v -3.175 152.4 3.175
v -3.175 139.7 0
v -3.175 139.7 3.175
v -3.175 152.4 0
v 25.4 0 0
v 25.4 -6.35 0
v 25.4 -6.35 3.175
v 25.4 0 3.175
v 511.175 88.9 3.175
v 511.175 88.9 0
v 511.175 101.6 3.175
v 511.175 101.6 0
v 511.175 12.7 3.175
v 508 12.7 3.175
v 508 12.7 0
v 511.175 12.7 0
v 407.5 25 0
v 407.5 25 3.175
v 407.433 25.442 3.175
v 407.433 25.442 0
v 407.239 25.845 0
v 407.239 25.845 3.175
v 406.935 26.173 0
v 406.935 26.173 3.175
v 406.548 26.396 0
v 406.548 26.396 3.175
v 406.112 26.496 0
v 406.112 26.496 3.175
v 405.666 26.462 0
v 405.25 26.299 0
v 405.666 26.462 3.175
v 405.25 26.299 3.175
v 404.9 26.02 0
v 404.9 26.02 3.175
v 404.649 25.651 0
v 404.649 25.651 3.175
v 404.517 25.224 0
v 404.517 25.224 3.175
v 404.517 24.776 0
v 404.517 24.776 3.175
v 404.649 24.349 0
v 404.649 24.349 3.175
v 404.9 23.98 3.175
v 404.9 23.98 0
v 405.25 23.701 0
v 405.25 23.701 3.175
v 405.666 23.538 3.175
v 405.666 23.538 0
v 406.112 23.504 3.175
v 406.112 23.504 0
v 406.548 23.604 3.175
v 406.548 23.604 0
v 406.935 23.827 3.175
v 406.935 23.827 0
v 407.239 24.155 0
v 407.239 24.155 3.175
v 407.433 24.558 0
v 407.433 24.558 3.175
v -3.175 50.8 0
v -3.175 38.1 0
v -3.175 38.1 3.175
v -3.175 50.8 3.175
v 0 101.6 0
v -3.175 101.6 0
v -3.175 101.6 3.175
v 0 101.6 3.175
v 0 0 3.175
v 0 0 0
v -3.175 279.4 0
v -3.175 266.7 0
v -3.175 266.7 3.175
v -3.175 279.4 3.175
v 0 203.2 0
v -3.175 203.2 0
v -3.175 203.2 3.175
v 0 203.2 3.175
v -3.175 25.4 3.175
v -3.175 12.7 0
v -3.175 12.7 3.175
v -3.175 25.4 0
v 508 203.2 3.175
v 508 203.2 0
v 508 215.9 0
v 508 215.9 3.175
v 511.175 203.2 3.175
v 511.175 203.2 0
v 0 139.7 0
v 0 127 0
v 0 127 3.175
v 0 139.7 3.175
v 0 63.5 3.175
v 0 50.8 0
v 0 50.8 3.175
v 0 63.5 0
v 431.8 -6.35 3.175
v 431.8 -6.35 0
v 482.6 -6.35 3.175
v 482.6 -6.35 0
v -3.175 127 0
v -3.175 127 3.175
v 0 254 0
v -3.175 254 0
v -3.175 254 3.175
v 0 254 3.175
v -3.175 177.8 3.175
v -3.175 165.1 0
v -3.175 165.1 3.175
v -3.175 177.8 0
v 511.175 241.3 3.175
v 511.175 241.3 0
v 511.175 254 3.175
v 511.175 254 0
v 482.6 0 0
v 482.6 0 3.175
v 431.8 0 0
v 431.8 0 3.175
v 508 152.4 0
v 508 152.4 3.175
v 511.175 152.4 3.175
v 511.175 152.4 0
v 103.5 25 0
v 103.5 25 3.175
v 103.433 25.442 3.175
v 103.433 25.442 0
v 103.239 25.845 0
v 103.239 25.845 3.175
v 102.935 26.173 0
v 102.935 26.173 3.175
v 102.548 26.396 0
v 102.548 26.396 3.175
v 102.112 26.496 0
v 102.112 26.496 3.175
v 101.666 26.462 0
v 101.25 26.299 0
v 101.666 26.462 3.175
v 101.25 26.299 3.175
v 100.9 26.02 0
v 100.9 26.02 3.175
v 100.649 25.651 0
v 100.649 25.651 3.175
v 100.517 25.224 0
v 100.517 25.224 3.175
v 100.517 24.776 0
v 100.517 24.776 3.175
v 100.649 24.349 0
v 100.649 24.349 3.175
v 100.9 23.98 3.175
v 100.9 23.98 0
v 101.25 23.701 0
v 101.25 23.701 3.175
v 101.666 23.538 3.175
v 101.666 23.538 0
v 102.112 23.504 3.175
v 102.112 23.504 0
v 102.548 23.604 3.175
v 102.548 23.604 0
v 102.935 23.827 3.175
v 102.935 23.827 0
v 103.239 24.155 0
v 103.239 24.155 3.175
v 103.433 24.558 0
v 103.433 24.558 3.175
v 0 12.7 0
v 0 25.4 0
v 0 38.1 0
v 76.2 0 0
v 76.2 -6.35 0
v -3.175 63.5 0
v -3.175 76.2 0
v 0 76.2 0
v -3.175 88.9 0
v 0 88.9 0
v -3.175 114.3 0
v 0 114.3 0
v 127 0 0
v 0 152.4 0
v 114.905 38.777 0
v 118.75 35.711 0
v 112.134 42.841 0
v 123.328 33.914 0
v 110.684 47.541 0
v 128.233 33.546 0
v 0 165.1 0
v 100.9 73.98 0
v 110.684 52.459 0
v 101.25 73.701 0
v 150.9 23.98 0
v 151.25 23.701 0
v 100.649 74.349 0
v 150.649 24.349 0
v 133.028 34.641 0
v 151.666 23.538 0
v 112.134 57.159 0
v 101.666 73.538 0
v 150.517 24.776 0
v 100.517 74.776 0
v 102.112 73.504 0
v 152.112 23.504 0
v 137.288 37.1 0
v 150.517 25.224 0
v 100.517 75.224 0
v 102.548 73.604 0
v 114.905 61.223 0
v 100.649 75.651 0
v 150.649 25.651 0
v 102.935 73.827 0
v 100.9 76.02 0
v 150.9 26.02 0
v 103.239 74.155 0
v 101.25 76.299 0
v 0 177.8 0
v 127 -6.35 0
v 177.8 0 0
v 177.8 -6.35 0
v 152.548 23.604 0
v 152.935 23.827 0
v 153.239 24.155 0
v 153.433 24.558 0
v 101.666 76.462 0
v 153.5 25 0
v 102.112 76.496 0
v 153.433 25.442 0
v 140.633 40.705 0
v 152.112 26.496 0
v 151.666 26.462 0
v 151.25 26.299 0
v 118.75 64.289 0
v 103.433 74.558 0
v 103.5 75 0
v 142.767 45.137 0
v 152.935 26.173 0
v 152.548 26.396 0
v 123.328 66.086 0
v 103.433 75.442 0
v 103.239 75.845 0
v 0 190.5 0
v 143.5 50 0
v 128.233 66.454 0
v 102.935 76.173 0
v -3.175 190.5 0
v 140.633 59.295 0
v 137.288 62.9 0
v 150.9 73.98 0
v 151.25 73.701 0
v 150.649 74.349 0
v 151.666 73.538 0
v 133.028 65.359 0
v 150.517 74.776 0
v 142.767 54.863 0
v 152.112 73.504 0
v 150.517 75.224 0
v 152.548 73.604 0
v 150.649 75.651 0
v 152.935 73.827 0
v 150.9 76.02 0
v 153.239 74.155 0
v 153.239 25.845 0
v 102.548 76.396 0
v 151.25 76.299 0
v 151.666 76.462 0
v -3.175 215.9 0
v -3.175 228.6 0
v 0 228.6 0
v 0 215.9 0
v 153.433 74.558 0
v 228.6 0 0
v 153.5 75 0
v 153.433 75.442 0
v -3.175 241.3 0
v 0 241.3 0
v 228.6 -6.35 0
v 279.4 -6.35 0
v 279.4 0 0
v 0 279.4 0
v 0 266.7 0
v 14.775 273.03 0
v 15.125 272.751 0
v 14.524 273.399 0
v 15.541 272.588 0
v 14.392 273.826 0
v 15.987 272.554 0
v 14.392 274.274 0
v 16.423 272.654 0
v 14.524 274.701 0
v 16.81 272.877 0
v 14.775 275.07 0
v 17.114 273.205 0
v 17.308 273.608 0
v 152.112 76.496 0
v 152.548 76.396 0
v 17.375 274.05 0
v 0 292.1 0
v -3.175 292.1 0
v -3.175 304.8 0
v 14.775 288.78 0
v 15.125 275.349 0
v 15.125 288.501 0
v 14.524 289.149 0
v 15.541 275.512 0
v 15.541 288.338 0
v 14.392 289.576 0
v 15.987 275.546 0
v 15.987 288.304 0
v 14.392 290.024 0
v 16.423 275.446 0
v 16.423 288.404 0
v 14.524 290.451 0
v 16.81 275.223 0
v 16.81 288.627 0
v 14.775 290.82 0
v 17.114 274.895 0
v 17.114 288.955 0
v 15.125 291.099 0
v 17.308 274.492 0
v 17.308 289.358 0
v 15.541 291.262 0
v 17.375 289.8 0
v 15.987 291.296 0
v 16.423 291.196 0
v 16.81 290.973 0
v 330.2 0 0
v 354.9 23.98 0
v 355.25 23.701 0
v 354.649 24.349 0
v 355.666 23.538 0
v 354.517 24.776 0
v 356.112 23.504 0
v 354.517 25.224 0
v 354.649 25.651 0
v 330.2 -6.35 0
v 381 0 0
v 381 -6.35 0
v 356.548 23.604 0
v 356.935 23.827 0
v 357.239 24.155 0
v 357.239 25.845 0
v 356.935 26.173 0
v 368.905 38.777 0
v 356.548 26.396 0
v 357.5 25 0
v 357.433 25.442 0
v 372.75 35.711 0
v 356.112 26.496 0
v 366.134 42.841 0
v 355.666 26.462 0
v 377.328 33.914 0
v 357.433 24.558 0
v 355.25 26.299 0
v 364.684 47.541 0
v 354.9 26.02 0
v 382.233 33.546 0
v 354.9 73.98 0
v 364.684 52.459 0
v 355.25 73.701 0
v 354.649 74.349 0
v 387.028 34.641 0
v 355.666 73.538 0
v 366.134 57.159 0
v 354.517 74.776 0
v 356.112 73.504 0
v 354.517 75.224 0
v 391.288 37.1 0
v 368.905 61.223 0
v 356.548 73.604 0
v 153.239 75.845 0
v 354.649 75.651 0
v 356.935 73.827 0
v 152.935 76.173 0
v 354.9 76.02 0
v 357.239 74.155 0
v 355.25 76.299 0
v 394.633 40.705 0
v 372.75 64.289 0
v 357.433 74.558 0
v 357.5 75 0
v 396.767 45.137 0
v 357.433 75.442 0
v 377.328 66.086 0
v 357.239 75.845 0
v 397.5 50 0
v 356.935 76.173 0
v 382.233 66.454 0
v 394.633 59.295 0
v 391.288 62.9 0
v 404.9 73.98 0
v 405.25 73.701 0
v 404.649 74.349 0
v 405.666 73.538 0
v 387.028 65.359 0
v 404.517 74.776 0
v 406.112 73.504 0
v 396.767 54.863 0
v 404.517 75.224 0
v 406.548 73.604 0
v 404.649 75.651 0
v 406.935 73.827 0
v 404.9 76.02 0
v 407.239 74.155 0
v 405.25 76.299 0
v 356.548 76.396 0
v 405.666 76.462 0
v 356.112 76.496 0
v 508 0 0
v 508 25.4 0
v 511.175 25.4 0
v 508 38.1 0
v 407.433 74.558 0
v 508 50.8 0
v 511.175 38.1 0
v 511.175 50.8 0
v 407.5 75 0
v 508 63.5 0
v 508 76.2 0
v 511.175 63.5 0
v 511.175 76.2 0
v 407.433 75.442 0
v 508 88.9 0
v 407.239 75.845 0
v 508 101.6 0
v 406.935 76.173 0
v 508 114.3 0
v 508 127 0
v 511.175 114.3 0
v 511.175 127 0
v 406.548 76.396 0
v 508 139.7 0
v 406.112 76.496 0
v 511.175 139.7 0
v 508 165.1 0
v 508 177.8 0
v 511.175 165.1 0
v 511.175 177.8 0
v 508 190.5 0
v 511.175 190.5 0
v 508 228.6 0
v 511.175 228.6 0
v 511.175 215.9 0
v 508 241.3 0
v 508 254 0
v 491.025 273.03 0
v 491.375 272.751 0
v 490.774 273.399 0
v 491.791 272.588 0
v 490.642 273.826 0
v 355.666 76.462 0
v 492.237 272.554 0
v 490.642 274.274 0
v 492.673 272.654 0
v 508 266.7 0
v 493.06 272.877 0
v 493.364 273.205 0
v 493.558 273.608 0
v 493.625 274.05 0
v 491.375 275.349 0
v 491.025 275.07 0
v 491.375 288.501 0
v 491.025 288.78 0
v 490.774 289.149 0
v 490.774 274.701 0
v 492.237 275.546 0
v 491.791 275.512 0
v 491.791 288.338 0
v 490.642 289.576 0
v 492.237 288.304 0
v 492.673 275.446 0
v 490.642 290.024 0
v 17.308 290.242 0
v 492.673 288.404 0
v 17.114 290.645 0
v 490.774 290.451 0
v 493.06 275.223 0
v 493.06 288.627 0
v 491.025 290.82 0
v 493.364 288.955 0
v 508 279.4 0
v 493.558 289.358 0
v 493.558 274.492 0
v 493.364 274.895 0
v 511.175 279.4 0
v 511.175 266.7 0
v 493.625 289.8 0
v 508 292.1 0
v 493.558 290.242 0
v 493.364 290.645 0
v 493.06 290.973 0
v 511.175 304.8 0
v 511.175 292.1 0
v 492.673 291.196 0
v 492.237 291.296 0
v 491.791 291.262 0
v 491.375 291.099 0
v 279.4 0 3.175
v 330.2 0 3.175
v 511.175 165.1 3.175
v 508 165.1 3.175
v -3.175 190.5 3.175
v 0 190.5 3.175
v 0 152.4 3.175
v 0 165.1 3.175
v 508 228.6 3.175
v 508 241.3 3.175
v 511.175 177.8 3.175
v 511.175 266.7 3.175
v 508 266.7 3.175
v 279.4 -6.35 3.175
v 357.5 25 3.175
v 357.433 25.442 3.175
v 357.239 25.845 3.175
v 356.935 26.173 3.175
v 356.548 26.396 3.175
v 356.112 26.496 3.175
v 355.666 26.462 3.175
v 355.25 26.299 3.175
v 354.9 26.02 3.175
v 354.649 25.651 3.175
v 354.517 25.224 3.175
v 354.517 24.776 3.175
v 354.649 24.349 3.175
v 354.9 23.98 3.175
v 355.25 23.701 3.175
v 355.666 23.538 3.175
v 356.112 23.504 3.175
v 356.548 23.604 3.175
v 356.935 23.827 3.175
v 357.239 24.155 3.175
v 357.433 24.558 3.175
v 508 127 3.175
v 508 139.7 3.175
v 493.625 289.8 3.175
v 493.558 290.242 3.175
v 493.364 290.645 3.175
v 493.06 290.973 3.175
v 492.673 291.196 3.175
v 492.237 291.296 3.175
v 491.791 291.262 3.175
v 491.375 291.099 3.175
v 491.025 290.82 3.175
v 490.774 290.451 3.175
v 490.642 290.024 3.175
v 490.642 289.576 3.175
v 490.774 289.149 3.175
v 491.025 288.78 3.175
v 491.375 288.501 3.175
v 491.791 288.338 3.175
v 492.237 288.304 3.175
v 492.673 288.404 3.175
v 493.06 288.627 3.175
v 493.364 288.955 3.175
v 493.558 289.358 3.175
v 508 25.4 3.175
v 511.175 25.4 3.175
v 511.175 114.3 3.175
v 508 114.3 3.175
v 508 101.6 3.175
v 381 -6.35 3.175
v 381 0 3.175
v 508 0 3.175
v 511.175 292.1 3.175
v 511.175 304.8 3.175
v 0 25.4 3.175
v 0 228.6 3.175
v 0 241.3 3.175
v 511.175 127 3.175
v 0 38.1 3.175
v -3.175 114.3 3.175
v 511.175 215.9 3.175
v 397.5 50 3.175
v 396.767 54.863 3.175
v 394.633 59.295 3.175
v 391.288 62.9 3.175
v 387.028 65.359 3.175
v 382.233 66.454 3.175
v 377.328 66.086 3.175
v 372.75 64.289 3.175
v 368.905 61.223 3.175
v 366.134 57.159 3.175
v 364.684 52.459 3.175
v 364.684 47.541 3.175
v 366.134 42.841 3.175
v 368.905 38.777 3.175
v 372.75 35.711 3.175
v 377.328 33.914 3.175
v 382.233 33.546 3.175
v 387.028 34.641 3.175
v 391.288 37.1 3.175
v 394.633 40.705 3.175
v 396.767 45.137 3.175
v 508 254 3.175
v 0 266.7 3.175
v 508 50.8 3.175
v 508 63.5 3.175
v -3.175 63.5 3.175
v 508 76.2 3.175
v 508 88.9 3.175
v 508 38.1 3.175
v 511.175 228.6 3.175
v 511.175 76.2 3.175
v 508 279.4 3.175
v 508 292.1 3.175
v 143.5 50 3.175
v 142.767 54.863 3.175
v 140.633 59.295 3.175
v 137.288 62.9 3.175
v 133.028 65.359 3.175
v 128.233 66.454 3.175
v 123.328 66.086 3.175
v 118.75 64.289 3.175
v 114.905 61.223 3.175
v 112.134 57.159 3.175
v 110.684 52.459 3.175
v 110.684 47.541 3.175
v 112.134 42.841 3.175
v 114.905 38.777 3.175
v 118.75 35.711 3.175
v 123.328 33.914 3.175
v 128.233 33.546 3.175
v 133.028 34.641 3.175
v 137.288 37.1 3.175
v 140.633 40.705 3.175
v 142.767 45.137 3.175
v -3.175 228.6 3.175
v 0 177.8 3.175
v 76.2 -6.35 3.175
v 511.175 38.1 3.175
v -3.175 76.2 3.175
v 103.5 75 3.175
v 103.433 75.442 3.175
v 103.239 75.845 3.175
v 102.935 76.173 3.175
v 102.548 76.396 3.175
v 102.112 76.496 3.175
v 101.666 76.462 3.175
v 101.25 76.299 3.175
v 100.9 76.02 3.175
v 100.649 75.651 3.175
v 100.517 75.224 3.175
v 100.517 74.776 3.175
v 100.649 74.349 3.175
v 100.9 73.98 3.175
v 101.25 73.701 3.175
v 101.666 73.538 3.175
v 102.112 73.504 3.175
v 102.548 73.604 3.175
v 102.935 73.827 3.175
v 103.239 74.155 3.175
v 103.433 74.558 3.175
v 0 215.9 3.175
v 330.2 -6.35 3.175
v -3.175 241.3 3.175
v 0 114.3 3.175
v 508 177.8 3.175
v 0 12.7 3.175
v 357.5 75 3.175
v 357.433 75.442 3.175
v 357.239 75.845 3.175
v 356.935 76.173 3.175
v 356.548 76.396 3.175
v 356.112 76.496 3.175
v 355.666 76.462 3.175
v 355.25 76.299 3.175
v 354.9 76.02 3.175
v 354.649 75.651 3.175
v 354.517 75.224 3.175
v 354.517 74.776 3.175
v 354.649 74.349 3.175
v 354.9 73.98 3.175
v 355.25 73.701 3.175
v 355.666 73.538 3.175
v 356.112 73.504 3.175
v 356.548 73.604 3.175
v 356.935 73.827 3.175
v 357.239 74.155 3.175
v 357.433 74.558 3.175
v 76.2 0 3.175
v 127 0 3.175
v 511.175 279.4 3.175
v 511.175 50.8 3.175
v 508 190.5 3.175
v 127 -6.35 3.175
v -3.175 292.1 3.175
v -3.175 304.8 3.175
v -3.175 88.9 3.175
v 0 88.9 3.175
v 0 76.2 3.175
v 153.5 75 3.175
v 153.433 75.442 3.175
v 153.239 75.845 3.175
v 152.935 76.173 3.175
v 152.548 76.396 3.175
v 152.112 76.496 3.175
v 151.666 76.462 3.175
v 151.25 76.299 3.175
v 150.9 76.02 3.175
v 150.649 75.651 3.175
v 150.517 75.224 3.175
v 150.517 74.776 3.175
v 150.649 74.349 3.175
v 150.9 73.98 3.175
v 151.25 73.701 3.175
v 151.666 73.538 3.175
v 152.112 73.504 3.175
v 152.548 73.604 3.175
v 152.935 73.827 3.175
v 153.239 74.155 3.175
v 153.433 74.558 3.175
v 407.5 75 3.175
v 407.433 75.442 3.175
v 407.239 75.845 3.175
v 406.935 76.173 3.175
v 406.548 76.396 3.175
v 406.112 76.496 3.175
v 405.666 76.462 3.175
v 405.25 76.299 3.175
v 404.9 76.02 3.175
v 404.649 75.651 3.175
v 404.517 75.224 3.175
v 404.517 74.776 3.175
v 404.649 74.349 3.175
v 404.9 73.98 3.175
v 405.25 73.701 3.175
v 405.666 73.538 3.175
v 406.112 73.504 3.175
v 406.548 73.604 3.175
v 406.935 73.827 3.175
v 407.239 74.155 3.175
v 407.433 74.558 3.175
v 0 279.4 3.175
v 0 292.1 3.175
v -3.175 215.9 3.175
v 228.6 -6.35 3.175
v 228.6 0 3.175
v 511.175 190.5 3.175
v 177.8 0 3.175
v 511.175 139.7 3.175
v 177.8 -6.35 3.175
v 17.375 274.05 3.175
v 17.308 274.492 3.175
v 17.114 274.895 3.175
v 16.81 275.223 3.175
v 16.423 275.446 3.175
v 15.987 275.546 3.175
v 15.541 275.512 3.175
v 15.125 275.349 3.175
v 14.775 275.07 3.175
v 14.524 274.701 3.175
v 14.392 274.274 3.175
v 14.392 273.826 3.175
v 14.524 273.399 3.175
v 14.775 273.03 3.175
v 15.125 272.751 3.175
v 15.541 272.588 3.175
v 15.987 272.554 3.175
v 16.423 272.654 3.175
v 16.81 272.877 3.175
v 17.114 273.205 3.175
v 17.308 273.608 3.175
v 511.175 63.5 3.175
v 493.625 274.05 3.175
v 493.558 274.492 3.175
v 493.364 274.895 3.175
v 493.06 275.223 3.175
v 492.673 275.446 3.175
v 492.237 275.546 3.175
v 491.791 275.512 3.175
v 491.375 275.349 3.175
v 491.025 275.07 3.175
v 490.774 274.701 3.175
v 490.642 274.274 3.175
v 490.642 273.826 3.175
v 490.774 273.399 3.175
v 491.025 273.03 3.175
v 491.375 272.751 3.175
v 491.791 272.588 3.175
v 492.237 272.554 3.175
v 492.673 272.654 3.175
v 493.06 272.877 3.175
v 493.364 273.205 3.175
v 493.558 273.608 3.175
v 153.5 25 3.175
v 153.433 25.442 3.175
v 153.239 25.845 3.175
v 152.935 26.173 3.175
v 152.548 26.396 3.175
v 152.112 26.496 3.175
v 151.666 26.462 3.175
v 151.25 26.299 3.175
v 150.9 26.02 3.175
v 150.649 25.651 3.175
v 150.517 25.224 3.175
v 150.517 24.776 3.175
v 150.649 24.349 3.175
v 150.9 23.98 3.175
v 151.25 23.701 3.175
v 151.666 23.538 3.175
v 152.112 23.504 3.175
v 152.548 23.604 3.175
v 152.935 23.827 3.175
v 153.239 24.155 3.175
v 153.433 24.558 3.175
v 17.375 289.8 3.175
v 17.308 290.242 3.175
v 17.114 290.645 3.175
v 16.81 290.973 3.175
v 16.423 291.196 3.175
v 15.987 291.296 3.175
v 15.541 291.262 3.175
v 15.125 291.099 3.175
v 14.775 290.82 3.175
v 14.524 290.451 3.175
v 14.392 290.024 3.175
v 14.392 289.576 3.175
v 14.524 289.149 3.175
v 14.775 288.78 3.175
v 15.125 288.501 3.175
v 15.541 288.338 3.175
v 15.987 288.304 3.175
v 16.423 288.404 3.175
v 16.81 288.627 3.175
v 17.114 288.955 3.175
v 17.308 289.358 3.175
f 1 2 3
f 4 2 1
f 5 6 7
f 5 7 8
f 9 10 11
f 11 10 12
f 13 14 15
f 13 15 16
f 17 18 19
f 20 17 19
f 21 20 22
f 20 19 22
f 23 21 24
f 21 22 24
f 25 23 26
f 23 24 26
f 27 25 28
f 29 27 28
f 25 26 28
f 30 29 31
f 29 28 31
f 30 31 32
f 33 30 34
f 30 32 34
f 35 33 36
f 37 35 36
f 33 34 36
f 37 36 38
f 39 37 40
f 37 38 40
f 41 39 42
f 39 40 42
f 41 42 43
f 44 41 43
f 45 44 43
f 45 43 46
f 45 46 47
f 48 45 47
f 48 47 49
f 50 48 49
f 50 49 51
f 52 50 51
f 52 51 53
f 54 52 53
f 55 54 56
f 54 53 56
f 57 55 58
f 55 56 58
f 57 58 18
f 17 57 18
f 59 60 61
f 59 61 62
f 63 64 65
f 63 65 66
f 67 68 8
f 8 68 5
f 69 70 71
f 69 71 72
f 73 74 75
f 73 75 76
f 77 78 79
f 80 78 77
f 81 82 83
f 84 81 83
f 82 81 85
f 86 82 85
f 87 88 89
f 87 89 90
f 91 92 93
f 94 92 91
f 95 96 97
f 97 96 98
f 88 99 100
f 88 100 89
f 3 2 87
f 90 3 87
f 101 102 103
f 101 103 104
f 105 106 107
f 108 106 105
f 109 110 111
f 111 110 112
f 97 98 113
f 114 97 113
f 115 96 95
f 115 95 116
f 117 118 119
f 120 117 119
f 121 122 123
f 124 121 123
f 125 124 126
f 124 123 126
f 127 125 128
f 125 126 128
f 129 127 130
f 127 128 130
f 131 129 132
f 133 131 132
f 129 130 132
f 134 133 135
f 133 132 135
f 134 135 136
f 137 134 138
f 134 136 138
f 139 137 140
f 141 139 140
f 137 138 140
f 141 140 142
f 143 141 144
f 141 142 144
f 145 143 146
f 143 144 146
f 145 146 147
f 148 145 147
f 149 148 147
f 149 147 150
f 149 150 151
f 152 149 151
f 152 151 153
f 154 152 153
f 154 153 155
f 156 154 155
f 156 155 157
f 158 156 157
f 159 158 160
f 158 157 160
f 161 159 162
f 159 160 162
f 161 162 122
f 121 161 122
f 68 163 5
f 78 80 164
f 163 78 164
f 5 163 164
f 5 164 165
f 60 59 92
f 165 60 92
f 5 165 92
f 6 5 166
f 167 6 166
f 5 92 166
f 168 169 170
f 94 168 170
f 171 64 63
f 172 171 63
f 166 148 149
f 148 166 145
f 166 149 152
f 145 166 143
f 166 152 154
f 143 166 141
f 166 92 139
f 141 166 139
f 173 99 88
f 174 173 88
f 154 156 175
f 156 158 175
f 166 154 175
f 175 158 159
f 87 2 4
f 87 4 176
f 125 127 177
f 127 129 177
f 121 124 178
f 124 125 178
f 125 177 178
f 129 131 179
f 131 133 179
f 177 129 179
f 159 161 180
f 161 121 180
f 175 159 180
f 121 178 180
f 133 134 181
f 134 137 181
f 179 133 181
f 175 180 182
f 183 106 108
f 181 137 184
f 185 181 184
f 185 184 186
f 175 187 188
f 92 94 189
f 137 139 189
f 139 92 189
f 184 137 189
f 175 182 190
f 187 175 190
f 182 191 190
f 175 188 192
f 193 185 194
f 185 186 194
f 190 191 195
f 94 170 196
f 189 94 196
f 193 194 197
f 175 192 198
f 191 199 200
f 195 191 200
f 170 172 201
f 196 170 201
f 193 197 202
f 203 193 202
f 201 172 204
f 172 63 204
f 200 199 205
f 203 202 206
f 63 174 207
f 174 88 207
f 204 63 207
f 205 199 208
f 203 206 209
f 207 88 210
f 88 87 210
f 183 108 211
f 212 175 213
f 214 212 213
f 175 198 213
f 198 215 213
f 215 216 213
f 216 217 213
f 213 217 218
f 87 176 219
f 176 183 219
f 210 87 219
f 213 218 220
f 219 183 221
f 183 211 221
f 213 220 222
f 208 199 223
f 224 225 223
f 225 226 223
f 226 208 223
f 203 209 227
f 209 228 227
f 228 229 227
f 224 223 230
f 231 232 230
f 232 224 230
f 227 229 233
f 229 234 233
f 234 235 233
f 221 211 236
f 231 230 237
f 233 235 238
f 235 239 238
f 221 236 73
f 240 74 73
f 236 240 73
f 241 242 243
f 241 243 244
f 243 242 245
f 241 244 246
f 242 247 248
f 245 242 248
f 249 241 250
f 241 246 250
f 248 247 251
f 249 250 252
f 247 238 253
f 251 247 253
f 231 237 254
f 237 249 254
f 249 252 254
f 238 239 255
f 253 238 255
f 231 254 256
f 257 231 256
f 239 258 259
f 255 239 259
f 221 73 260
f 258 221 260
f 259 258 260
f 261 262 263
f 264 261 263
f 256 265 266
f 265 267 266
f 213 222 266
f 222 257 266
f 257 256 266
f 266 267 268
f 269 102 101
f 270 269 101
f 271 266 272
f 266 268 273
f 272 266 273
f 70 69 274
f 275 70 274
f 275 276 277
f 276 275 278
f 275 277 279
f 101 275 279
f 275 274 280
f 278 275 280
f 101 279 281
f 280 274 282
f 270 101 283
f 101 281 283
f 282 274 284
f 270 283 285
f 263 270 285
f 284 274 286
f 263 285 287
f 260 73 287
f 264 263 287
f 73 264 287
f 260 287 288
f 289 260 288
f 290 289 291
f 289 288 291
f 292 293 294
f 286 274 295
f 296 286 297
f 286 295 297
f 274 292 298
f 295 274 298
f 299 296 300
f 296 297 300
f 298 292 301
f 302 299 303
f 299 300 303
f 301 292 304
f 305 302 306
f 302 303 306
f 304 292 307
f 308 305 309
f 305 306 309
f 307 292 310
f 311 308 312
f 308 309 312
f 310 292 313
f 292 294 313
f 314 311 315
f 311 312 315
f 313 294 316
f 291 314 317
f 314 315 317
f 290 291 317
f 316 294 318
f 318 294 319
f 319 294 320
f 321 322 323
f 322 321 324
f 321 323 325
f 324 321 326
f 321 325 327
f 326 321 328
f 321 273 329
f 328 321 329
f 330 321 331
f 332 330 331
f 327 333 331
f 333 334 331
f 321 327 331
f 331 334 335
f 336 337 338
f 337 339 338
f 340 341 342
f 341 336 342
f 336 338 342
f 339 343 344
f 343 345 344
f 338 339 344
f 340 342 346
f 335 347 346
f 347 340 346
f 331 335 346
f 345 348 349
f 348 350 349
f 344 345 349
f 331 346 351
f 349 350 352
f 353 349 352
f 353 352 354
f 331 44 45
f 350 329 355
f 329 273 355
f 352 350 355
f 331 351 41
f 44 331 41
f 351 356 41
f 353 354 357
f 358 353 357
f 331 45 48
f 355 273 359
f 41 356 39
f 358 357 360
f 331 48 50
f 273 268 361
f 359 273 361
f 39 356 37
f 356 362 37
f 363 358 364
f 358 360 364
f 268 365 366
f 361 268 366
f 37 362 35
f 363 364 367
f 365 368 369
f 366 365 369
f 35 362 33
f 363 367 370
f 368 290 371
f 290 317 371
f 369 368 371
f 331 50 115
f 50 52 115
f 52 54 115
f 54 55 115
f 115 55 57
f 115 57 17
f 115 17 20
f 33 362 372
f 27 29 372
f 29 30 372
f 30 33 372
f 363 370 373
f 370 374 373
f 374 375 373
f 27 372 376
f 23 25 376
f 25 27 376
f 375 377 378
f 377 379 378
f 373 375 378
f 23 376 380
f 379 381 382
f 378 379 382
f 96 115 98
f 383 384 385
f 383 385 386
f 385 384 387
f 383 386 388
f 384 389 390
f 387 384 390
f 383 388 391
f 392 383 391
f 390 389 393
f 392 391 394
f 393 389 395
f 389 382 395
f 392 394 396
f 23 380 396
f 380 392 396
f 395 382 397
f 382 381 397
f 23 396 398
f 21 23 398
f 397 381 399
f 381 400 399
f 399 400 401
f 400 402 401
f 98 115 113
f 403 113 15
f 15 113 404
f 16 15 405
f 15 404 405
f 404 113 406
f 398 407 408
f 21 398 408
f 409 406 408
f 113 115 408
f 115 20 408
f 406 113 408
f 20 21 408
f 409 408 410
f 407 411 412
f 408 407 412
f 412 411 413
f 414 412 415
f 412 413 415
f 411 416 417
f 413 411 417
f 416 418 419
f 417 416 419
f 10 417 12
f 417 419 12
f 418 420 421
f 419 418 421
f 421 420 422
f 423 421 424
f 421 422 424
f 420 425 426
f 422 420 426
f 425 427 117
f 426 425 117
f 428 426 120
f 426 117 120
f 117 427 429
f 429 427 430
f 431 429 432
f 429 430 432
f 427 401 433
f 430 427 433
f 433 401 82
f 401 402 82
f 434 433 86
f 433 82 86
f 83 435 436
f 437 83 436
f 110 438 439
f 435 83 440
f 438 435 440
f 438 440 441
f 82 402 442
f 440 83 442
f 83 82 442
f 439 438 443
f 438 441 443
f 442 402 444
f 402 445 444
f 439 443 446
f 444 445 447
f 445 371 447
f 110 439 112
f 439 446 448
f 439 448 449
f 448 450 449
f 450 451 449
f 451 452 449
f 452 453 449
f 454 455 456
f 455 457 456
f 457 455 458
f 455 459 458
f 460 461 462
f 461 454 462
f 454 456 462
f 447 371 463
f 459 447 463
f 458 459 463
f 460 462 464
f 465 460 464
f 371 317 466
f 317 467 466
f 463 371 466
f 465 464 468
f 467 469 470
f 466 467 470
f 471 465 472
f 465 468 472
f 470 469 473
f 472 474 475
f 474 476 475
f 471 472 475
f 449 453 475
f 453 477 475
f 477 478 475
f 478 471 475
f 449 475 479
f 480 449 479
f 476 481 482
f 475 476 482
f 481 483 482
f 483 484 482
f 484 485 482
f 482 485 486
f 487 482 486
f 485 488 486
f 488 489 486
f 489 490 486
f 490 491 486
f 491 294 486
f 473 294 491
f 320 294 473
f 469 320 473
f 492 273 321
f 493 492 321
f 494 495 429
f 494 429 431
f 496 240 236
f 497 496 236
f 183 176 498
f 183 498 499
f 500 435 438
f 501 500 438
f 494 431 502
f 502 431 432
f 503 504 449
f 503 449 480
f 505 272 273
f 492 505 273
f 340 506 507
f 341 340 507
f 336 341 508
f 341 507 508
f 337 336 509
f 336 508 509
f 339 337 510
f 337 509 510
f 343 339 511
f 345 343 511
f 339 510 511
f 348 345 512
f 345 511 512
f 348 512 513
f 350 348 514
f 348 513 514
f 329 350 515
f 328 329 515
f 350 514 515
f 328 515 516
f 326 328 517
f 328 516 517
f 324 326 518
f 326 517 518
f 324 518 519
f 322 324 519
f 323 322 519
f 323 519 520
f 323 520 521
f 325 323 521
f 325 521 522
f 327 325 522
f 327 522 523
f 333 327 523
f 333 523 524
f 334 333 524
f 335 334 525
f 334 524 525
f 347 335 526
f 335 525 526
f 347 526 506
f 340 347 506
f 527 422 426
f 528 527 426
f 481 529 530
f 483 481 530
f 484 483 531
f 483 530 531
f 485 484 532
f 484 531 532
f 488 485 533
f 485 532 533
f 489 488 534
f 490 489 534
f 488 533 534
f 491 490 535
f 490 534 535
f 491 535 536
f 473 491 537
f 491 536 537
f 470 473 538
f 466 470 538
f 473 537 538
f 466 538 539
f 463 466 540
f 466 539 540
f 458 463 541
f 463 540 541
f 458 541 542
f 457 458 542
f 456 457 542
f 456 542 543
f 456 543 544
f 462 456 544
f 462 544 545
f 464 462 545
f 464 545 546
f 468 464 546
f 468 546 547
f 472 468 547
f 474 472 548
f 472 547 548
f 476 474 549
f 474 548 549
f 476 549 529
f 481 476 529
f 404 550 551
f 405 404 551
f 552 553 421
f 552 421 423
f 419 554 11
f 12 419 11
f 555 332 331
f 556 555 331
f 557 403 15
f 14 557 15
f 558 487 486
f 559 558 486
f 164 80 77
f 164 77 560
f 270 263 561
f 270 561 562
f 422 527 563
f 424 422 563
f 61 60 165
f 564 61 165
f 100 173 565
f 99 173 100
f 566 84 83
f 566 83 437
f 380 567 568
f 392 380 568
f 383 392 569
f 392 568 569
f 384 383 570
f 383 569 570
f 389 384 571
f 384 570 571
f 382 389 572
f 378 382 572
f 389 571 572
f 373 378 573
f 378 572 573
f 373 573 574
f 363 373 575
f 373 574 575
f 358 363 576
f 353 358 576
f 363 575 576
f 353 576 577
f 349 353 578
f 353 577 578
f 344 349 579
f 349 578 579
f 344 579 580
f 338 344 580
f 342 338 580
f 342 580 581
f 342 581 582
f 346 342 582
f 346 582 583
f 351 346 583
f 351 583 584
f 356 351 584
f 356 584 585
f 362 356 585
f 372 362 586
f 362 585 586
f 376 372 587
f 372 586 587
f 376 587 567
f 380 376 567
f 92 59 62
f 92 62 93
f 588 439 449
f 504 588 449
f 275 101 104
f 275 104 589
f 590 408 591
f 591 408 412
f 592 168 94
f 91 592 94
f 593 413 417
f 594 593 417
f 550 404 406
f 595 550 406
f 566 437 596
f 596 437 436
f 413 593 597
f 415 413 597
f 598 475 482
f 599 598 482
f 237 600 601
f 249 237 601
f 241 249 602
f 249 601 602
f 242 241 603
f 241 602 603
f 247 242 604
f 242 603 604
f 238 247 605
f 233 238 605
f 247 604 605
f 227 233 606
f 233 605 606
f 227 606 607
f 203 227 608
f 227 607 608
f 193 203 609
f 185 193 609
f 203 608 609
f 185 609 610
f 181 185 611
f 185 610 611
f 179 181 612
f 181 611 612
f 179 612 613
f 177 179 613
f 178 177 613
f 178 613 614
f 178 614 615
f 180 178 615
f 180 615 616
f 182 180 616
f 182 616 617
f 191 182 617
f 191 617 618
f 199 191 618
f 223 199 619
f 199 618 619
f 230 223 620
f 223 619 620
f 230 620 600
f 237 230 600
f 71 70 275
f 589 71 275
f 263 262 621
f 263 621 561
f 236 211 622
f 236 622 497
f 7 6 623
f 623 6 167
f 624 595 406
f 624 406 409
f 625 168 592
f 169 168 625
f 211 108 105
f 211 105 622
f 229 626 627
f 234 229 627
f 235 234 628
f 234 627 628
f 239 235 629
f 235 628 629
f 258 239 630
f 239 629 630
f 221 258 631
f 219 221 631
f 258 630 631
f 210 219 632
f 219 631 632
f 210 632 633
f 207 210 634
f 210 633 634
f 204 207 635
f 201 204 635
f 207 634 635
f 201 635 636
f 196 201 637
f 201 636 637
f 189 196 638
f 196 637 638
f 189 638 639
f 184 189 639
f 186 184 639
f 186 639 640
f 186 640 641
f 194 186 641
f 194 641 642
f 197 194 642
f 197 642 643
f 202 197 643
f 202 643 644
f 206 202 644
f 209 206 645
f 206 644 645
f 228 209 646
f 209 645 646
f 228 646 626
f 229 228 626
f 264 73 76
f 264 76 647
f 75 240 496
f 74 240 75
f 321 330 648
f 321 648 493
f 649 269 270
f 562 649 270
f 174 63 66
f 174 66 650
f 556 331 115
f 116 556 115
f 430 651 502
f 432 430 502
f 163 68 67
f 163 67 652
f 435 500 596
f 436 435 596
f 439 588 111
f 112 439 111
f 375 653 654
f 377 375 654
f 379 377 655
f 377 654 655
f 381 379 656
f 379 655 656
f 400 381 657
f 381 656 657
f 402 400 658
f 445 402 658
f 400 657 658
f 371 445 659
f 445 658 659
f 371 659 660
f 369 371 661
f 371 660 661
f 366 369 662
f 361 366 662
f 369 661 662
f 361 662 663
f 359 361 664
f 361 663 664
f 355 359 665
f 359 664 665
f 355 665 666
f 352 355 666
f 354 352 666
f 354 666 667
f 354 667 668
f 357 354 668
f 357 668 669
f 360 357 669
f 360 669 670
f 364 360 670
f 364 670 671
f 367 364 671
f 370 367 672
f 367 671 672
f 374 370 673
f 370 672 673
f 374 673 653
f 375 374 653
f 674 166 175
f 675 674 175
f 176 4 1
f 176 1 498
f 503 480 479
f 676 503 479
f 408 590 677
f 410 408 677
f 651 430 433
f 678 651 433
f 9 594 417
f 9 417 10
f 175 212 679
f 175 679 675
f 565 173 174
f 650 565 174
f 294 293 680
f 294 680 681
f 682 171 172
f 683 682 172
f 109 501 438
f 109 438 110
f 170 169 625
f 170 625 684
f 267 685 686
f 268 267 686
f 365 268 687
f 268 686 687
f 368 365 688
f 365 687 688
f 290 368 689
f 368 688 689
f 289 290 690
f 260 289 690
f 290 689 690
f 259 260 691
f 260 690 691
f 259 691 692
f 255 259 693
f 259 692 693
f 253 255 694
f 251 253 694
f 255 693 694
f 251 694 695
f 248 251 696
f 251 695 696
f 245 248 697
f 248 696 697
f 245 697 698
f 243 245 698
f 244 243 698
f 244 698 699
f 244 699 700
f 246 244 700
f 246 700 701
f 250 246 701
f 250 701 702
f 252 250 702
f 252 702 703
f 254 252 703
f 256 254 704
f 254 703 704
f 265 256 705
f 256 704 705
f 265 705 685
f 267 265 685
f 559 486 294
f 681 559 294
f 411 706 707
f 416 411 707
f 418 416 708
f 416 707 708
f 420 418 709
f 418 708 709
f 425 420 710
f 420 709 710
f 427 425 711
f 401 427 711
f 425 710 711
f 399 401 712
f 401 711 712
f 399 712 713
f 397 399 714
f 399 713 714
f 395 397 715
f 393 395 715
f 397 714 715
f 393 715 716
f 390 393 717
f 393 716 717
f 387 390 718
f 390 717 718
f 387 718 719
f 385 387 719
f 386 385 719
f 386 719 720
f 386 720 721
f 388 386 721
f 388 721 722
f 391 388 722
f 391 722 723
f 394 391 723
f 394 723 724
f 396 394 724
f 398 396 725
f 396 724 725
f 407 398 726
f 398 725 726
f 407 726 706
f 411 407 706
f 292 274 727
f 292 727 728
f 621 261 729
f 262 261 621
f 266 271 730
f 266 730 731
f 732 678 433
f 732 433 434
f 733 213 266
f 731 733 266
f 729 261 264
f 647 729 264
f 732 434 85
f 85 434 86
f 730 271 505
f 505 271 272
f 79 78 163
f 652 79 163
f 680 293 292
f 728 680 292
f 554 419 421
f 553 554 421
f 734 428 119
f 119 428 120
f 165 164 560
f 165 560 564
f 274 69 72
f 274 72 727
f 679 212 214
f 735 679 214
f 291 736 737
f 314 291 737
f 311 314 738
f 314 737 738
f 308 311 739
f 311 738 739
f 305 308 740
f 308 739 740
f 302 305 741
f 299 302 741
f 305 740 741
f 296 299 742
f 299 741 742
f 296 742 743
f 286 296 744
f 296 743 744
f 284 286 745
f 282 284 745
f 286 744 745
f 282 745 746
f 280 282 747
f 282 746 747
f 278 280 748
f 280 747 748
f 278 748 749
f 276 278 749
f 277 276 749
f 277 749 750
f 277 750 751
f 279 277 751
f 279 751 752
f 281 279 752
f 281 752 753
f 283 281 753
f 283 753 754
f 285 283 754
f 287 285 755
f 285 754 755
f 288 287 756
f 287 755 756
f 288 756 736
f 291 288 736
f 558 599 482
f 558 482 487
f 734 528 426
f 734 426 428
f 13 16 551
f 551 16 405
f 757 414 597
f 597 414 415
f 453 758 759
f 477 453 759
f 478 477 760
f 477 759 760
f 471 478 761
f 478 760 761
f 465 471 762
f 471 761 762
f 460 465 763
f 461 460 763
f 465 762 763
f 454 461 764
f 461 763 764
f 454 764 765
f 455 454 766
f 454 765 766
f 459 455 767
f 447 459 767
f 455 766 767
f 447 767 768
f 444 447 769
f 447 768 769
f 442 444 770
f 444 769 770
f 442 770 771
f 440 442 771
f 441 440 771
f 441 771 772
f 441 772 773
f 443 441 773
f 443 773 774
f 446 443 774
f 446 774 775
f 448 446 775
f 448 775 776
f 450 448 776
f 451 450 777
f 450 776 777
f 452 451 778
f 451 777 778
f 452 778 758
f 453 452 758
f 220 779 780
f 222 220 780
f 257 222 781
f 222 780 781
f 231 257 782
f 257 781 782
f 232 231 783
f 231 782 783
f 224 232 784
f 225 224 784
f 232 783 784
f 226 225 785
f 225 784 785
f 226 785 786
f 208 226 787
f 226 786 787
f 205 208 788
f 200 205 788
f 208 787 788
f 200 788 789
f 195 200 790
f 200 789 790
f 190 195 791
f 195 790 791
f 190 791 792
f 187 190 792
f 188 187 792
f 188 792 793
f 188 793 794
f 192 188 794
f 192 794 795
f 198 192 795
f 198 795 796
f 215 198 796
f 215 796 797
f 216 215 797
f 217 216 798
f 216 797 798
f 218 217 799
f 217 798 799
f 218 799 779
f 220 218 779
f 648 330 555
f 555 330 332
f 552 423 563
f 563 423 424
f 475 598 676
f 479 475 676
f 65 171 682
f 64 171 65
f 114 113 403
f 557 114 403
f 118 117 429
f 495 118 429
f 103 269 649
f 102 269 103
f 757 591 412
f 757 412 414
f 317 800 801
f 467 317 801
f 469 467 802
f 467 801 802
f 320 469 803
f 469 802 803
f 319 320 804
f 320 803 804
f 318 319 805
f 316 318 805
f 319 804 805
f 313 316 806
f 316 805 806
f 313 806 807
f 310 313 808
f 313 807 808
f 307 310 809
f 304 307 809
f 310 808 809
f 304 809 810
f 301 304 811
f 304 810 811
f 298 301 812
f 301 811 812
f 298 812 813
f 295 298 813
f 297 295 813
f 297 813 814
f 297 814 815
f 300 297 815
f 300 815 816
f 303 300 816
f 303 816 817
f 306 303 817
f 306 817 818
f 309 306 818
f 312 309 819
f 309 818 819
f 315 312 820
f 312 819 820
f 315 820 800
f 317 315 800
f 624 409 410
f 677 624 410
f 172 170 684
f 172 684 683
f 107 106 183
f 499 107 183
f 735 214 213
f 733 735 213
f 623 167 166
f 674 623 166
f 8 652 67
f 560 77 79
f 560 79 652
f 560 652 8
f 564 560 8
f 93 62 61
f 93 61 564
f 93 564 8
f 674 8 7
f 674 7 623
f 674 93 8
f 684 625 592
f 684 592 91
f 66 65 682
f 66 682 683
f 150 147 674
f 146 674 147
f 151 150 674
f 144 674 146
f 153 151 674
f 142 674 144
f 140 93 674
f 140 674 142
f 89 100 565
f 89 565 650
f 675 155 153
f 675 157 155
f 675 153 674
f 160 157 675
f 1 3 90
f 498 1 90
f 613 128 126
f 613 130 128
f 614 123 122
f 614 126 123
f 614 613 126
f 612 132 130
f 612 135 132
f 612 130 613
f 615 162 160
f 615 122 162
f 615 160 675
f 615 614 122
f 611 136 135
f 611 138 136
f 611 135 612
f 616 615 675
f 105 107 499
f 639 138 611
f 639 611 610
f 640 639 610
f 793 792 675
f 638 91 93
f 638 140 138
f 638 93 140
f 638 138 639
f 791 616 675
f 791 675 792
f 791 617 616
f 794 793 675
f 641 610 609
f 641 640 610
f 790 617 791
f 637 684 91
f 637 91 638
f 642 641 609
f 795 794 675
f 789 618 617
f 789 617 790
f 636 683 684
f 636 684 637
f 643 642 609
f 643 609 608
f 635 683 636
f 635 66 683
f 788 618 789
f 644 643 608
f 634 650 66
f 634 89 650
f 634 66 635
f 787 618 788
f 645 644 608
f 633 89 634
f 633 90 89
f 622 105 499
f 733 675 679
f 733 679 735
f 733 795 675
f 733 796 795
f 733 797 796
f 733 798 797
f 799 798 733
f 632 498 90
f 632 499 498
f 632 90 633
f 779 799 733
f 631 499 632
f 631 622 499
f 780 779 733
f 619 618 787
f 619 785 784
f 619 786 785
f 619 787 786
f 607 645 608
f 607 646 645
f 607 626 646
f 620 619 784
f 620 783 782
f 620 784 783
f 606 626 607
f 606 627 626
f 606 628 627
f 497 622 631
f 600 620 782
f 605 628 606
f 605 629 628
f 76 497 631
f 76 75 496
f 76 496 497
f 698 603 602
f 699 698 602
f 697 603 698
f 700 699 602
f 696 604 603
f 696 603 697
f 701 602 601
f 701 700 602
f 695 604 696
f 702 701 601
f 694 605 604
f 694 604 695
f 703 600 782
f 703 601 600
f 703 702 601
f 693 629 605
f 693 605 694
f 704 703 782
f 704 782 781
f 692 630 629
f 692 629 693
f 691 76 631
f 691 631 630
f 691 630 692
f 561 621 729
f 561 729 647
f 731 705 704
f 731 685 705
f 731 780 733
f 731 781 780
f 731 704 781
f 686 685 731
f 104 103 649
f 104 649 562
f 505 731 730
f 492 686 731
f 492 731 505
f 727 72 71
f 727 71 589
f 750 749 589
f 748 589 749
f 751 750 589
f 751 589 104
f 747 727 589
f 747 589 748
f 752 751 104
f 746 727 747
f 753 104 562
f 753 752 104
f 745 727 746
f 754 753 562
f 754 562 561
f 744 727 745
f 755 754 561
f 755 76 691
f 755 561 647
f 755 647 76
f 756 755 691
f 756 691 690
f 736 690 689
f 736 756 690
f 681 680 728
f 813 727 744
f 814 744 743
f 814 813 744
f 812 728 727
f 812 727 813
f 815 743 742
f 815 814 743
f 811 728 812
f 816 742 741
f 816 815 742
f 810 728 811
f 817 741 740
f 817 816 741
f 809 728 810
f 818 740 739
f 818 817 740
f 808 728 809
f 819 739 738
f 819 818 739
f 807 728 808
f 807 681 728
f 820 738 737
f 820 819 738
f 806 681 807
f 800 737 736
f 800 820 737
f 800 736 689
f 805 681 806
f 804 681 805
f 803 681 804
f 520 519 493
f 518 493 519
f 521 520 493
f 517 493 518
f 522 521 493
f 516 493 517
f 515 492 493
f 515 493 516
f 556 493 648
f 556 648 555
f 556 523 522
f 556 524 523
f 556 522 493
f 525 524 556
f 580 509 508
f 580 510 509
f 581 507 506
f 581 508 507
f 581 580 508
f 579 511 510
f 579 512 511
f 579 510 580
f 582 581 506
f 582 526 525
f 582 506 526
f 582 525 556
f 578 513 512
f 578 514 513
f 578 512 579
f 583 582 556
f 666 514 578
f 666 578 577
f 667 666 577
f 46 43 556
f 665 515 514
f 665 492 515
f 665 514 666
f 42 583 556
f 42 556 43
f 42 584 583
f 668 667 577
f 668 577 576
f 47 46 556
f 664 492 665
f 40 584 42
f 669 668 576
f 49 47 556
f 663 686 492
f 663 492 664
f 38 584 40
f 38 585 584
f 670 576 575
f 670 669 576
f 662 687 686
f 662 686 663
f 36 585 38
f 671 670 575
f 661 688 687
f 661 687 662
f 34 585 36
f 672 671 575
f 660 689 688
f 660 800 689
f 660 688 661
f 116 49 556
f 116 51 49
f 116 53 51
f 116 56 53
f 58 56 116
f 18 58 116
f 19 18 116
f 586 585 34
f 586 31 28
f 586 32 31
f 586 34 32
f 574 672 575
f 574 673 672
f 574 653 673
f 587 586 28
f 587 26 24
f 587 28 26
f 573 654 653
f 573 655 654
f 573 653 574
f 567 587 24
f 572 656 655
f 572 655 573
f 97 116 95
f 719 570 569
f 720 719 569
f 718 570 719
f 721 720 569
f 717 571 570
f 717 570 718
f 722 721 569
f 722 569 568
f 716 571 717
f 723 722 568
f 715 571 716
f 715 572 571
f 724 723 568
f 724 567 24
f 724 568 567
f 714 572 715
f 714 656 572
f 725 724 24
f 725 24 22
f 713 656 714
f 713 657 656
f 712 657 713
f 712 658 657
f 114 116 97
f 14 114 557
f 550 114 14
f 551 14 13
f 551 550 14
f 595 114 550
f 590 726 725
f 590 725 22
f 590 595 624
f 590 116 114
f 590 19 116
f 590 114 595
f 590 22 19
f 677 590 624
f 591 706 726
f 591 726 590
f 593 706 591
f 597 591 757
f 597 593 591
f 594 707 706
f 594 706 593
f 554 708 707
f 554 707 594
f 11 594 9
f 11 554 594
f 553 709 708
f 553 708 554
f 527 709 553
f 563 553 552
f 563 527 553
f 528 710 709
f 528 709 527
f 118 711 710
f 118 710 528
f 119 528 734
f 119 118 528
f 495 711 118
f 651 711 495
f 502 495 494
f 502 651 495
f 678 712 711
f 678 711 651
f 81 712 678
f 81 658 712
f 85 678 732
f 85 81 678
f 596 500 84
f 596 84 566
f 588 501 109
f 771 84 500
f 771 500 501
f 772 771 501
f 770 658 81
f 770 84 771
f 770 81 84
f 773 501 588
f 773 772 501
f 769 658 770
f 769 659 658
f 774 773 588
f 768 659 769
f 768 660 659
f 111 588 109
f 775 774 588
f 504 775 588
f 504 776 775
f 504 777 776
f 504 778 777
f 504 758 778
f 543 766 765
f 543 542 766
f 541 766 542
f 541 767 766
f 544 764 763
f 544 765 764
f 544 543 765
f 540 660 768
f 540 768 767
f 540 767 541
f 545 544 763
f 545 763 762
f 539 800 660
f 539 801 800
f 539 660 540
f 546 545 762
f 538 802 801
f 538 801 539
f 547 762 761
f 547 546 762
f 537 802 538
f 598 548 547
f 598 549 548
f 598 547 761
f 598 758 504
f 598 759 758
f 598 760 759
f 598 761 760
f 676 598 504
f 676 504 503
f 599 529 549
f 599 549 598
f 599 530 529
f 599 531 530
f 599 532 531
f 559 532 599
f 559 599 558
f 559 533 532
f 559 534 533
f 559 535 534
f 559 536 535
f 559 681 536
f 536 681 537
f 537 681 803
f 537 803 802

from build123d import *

# Parameters (mm, degrees)
SKETCH1_W           = 508
SKETCH1_H           = 304.8
SKETCH1_W_2         = 50.8
SKETCH1_H_2         = 6.35
SKETCH1_W_3         = 3.175
SKETCH1_H_3         = 12.7
BOSS_EXTRUDE1_DEPTH = 3.175
SKETCH2_R           = 16.5
SKETCH2_R_2         = 1.5
CUT_EXTRUDE1_DEPTH  = 3.175
SKETCH3_R           = 1.5
CUT_EXTRUDE2_DEPTH  = 3.175


with BuildPart() as part:
    # Sketch1 → Boss-Extrude1 (new body)
    with BuildSketch(Plane.XY):
        with Locations((254, 152.4)):
            Rectangle(SKETCH1_W, SKETCH1_H)
        with Locations((50.8, -3.175)):
            Rectangle(SKETCH1_W_2, SKETCH1_H_2)
        with Locations((152.4, -3.175)):
            Rectangle(SKETCH1_W_2, SKETCH1_H_2)
        with Locations((254, -3.175)):
            Rectangle(SKETCH1_W_2, SKETCH1_H_2)
        with Locations((355.6, -3.175)):
            Rectangle(SKETCH1_W_2, SKETCH1_H_2)
        with Locations((457.2, -3.175)):
            Rectangle(SKETCH1_W_2, SKETCH1_H_2)
        with Locations((-1.5875, 19.05)):
            Rectangle(SKETCH1_W_3, SKETCH1_H_3)
        with Locations((-1.5875, 44.45)):
            Rectangle(SKETCH1_W_3, SKETCH1_H_3)
        with Locations((-1.5875, 69.85)):
            Rectangle(SKETCH1_W_3, SKETCH1_H_3)
        with Locations((-1.5875, 95.25)):
            Rectangle(SKETCH1_W_3, SKETCH1_H_3)
        with Locations((-1.5875, 120.65)):
            Rectangle(SKETCH1_W_3, SKETCH1_H_3)
        with Locations((-1.5875, 146.05)):
            Rectangle(SKETCH1_W_3, SKETCH1_H_3)
        with Locations((-1.5875, 171.45)):
            Rectangle(SKETCH1_W_3, SKETCH1_H_3)
        with Locations((-1.5875, 196.85)):
            Rectangle(SKETCH1_W_3, SKETCH1_H_3)
        with Locations((-1.5875, 222.25)):
            Rectangle(SKETCH1_W_3, SKETCH1_H_3)
        with Locations((-1.5875, 247.65)):
            Rectangle(SKETCH1_W_3, SKETCH1_H_3)
        with Locations((-1.5875, 273.05)):
            Rectangle(SKETCH1_W_3, SKETCH1_H_3)
        with Locations((-1.5875, 298.45)):
            Rectangle(SKETCH1_W_3, SKETCH1_H_3)
        with Locations((509.5875, 19.05)):
            Rectangle(SKETCH1_W_3, SKETCH1_H_3)
        with Locations((509.5875, 44.45)):
            Rectangle(SKETCH1_W_3, SKETCH1_H_3)
        with Locations((509.5875, 69.85)):
            Rectangle(SKETCH1_W_3, SKETCH1_H_3)
        with Locations((509.5875, 95.25)):
            Rectangle(SKETCH1_W_3, SKETCH1_H_3)
        with Locations((509.5875, 146.05)):
            Rectangle(SKETCH1_W_3, SKETCH1_H_3)
        with Locations((509.5875, 120.65)):
            Rectangle(SKETCH1_W_3, SKETCH1_H_3)
        with Locations((509.5875, 171.45)):
            Rectangle(SKETCH1_W_3, SKETCH1_H_3)
        with Locations((509.5875, 196.85)):
            Rectangle(SKETCH1_W_3, SKETCH1_H_3)
        with Locations((509.5875, 222.25)):
            Rectangle(SKETCH1_W_3, SKETCH1_H_3)
        with Locations((509.5875, 247.65)):
            Rectangle(SKETCH1_W_3, SKETCH1_H_3)
        with Locations((509.5875, 273.05)):
            Rectangle(SKETCH1_W_3, SKETCH1_H_3)
        with Locations((509.5875, 298.45)):
            Rectangle(SKETCH1_W_3, SKETCH1_H_3)
    extrude(amount=BOSS_EXTRUDE1_DEPTH)

    # Sketch2 → Cut-Extrude1 (cut)
    with BuildSketch(Plane.XY.offset(3.175)):
        with Locations((127, 50)):
            Circle(SKETCH2_R)
        with Locations((102, 75)):
            Circle(SKETCH2_R_2)
        with Locations((152, 75)):
            Circle(SKETCH2_R_2)
        with Locations((152, 25)):
            Circle(SKETCH2_R_2)
        with Locations((102, 25)):
            Circle(SKETCH2_R_2)
        with Locations((381, 50)):
            Circle(SKETCH2_R)
        with Locations((356, 75)):
            Circle(SKETCH2_R_2)
        with Locations((356, 25)):
            Circle(SKETCH2_R_2)
        with Locations((406, 25)):
            Circle(SKETCH2_R_2)
        with Locations((406, 75)):
            Circle(SKETCH2_R_2)
    extrude(amount=-CUT_EXTRUDE1_DEPTH, mode=Mode.SUBTRACT)

    # Sketch3 → Cut-Extrude2 (cut)
    with BuildSketch(Plane.XY.offset(3.175)):
        with Locations((15.875, 289.8)):
            Circle(SKETCH3_R)
        with Locations((15.875, 274.05)):
            Circle(SKETCH3_R)
        with Locations((492.125, 289.8)):
            Circle(SKETCH3_R)
        with Locations((492.125, 274.05)):
            Circle(SKETCH3_R)
    extrude(amount=-CUT_EXTRUDE2_DEPTH, mode=Mode.SUBTRACT)


solid = part.part
